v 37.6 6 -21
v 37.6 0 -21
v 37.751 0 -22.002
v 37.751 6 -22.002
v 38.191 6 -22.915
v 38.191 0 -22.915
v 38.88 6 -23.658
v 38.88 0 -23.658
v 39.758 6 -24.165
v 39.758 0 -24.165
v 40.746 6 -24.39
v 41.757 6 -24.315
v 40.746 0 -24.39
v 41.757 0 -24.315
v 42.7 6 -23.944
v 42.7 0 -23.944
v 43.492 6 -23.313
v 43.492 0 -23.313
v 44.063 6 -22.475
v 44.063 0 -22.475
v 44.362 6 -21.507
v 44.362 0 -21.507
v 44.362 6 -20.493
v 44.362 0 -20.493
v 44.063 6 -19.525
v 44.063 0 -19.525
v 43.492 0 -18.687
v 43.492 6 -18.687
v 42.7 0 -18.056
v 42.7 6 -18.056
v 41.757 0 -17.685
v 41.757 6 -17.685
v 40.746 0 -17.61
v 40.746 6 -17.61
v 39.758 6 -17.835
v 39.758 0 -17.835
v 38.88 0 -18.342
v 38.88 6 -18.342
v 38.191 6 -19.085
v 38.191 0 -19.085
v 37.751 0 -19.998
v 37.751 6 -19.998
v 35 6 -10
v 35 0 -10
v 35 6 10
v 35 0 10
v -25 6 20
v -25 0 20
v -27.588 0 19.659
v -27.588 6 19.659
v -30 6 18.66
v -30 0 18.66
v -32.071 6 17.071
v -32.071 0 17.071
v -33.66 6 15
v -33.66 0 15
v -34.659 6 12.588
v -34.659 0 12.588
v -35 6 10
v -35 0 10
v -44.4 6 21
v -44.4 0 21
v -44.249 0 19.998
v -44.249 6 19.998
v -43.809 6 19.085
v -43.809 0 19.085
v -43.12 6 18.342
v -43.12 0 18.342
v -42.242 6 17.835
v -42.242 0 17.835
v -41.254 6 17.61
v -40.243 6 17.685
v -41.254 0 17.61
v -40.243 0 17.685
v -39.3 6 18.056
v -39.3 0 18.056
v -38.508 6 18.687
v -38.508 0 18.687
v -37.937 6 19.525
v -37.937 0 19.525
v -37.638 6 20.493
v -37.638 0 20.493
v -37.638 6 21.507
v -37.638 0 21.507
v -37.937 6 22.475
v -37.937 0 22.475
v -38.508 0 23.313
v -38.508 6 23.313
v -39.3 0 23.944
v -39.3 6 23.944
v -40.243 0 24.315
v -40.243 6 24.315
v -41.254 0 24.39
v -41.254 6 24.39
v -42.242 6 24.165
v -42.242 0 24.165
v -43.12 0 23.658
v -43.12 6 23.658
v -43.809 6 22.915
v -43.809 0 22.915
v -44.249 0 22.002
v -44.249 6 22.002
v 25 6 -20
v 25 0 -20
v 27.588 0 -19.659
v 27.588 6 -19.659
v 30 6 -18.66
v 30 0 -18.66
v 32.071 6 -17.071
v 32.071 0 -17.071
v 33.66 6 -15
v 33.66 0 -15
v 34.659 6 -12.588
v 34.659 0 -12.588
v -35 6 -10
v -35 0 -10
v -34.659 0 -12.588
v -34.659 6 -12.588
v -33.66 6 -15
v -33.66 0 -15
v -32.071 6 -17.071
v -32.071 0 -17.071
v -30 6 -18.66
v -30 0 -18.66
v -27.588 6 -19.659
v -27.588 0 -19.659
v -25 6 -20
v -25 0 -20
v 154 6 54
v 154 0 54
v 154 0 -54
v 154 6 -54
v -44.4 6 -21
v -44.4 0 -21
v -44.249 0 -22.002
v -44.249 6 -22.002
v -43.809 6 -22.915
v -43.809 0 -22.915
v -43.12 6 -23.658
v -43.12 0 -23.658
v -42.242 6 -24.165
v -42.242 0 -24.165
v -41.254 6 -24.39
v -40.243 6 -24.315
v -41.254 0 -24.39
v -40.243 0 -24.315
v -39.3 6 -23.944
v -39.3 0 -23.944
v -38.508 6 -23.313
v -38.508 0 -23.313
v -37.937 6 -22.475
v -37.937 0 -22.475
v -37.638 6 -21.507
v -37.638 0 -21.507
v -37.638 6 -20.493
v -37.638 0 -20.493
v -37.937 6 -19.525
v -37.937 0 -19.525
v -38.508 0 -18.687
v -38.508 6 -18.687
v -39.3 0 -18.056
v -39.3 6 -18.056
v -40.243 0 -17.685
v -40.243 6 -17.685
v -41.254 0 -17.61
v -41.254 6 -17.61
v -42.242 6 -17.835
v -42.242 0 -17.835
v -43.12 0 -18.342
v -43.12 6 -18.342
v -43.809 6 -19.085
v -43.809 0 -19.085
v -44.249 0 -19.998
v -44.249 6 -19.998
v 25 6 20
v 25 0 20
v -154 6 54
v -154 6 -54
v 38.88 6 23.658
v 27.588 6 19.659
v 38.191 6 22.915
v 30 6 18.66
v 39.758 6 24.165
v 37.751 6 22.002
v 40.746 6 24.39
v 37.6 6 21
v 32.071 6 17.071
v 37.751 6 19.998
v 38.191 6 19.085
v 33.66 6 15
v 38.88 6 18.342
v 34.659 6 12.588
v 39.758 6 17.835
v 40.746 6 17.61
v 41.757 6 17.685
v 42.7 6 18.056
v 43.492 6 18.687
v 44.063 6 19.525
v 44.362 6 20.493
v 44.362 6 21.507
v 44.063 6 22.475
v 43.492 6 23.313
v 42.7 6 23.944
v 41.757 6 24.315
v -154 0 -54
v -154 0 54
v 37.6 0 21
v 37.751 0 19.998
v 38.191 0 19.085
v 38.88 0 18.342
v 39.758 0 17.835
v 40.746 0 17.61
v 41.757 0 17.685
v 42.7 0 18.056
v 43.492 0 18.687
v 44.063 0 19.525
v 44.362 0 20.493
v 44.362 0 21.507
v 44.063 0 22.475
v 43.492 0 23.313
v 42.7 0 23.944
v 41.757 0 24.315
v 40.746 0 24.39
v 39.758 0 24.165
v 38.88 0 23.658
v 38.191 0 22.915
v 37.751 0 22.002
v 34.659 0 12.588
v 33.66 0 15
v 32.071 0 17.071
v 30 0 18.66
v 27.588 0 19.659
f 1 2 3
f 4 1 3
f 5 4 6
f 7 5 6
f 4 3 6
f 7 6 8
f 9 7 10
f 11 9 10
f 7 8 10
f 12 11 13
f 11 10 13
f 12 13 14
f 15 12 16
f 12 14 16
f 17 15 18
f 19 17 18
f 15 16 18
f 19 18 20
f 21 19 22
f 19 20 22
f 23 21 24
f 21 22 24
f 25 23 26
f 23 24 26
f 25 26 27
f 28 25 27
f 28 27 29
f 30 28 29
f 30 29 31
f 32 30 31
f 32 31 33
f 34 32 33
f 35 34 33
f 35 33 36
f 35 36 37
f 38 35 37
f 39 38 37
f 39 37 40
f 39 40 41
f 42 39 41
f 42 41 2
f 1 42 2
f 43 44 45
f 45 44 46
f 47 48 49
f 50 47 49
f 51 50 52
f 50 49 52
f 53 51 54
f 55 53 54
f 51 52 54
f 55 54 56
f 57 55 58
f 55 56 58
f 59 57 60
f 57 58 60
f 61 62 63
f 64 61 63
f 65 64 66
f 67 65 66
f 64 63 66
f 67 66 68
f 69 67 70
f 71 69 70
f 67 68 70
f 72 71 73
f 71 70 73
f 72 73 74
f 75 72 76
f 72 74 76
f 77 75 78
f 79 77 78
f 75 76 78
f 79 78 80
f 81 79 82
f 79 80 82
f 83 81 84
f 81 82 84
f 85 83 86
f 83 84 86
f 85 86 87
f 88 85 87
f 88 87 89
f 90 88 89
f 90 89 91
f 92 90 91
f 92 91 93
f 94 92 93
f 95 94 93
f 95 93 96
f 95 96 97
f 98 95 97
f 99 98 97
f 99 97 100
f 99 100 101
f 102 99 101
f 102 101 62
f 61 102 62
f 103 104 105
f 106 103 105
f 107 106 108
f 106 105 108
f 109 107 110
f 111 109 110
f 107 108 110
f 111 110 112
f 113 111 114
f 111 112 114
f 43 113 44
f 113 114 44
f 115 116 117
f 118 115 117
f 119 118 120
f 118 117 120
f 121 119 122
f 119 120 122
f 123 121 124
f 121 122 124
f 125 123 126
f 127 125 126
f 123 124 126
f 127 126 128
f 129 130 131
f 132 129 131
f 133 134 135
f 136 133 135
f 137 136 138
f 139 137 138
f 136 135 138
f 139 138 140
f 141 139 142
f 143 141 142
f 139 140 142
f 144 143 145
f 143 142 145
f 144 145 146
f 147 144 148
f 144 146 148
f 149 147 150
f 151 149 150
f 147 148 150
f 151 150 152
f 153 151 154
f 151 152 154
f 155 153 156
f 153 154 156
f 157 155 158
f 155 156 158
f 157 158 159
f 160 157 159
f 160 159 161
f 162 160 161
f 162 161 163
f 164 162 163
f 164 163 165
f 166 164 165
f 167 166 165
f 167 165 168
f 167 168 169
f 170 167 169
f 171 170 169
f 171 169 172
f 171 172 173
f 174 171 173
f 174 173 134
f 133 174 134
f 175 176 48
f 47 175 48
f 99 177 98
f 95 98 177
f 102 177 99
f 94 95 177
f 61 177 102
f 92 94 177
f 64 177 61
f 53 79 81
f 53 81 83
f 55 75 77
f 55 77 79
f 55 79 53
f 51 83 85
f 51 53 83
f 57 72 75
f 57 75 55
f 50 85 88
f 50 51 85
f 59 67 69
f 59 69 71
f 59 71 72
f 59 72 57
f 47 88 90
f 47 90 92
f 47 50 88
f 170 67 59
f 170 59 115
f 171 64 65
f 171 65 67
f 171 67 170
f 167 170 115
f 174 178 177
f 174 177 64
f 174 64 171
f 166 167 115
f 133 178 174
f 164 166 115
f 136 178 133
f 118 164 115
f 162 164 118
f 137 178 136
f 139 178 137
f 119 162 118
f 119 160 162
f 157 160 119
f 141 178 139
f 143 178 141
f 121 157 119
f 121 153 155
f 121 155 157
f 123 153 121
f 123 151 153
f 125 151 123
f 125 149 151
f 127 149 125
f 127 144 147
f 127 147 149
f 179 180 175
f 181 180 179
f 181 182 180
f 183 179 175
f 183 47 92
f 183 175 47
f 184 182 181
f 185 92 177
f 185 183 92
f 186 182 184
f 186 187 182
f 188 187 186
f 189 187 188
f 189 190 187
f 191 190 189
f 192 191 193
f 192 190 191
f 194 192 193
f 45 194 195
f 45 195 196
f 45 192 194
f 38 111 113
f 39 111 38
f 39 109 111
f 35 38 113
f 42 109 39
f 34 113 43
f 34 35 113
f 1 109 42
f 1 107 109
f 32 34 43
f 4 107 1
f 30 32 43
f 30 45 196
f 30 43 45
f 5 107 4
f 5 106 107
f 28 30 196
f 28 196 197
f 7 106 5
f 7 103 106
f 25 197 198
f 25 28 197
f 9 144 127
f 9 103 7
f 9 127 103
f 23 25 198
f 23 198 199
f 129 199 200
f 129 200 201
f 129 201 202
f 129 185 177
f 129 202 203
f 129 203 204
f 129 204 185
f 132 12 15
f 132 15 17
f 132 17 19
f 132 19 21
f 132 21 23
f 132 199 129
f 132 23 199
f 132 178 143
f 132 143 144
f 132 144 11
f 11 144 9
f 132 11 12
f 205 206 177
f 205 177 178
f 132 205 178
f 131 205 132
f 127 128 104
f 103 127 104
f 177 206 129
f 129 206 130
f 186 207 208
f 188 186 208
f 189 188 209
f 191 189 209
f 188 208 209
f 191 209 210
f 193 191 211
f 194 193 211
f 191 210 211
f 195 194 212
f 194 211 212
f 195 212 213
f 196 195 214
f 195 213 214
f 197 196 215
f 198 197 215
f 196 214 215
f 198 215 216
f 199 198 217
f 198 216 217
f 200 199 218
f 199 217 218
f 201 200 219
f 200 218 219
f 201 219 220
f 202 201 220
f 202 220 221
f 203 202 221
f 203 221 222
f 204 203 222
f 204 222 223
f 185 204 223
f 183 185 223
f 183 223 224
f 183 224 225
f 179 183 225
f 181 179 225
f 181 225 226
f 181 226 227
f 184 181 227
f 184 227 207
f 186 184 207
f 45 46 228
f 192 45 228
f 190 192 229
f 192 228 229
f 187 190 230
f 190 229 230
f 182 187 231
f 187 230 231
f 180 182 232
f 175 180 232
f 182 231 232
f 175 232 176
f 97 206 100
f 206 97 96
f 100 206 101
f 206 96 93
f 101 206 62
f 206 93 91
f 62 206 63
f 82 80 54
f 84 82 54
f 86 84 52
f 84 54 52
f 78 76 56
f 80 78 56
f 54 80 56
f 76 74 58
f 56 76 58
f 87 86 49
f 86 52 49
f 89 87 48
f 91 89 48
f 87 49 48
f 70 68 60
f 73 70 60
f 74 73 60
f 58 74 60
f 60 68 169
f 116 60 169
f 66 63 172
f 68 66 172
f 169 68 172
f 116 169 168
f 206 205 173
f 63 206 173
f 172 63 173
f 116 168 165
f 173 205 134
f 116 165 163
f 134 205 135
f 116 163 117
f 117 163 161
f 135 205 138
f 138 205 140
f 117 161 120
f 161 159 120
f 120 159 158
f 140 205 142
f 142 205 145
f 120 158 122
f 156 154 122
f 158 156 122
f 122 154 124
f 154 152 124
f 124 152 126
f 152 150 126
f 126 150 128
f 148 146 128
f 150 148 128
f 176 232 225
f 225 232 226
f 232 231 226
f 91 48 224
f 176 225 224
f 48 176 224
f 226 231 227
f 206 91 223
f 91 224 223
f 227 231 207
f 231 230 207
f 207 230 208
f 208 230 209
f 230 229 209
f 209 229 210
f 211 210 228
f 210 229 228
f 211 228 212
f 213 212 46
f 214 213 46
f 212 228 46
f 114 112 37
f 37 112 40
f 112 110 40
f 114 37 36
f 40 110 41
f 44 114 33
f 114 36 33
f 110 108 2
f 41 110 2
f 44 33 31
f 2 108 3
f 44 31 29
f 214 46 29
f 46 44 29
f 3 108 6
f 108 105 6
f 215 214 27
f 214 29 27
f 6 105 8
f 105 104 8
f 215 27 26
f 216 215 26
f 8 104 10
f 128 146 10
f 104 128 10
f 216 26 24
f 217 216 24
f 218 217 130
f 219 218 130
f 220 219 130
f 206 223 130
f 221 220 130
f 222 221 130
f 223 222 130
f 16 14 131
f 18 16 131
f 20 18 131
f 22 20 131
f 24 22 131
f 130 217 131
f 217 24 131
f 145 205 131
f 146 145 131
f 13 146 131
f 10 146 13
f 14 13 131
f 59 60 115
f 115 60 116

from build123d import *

# Parameters (mm, degrees)
SKETCH1_W           = 308
SKETCH1_H           = 108
BOSS_EXTRUDE1_DEPTH = 6
CUT_EXTRUDE1_DEPTH  = 10
SKETCH3_R           = 3.4
CUT_EXTRUDE2_DEPTH  = 7


with BuildPart() as part:
    # Sketch1 → Boss-Extrude1 (new body)
    with BuildSketch(Plane(origin=(0, 0, 0), x_dir=(1, 0, 0), z_dir=(0, 1, 0))):
        Rectangle(SKETCH1_W, SKETCH1_H)
    extrude(amount=BOSS_EXTRUDE1_DEPTH)

    # Sketch2 → Cut-Extrude1 (cut)
    with BuildSketch(Plane.XZ):
        with BuildLine():
            Line((-25, -20), (25, -20))
            ThreePointArc((25, -20), (32.071067812, -17.071067812), (35, -10))
            Line((35, -10), (35, 10))
            ThreePointArc((35, 10), (32.071067812, 17.071067812), (25, 20))
            Line((25, 20), (-25, 20))
            ThreePointArc((-25, 20), (-32.071067812, 17.071067812), (-35, 10))
            Line((-35, 10), (-35, -10))
            ThreePointArc((-35, -10), (-32.071067812, -17.071067812), (-25, -20))
        make_face()
    extrude(amount=-CUT_EXTRUDE1_DEPTH, mode=Mode.SUBTRACT)

    # Sketch3 → Cut-Extrude2 (cut, through all)
    with BuildSketch(Plane(origin=(0, 0, 0), x_dir=(-1, 0, 0), z_dir=(0, -1, 0))):
        with Locations((41, -21)):
            Circle(SKETCH3_R)
        with Locations((-41, -21)):
            Circle(SKETCH3_R)
        with Locations((-41, 21)):
            Circle(SKETCH3_R)
        with Locations((41, 21)):
            Circle(SKETCH3_R)
    extrude(amount=-CUT_EXTRUDE2_DEPTH, mode=Mode.SUBTRACT)


solid = part.part
